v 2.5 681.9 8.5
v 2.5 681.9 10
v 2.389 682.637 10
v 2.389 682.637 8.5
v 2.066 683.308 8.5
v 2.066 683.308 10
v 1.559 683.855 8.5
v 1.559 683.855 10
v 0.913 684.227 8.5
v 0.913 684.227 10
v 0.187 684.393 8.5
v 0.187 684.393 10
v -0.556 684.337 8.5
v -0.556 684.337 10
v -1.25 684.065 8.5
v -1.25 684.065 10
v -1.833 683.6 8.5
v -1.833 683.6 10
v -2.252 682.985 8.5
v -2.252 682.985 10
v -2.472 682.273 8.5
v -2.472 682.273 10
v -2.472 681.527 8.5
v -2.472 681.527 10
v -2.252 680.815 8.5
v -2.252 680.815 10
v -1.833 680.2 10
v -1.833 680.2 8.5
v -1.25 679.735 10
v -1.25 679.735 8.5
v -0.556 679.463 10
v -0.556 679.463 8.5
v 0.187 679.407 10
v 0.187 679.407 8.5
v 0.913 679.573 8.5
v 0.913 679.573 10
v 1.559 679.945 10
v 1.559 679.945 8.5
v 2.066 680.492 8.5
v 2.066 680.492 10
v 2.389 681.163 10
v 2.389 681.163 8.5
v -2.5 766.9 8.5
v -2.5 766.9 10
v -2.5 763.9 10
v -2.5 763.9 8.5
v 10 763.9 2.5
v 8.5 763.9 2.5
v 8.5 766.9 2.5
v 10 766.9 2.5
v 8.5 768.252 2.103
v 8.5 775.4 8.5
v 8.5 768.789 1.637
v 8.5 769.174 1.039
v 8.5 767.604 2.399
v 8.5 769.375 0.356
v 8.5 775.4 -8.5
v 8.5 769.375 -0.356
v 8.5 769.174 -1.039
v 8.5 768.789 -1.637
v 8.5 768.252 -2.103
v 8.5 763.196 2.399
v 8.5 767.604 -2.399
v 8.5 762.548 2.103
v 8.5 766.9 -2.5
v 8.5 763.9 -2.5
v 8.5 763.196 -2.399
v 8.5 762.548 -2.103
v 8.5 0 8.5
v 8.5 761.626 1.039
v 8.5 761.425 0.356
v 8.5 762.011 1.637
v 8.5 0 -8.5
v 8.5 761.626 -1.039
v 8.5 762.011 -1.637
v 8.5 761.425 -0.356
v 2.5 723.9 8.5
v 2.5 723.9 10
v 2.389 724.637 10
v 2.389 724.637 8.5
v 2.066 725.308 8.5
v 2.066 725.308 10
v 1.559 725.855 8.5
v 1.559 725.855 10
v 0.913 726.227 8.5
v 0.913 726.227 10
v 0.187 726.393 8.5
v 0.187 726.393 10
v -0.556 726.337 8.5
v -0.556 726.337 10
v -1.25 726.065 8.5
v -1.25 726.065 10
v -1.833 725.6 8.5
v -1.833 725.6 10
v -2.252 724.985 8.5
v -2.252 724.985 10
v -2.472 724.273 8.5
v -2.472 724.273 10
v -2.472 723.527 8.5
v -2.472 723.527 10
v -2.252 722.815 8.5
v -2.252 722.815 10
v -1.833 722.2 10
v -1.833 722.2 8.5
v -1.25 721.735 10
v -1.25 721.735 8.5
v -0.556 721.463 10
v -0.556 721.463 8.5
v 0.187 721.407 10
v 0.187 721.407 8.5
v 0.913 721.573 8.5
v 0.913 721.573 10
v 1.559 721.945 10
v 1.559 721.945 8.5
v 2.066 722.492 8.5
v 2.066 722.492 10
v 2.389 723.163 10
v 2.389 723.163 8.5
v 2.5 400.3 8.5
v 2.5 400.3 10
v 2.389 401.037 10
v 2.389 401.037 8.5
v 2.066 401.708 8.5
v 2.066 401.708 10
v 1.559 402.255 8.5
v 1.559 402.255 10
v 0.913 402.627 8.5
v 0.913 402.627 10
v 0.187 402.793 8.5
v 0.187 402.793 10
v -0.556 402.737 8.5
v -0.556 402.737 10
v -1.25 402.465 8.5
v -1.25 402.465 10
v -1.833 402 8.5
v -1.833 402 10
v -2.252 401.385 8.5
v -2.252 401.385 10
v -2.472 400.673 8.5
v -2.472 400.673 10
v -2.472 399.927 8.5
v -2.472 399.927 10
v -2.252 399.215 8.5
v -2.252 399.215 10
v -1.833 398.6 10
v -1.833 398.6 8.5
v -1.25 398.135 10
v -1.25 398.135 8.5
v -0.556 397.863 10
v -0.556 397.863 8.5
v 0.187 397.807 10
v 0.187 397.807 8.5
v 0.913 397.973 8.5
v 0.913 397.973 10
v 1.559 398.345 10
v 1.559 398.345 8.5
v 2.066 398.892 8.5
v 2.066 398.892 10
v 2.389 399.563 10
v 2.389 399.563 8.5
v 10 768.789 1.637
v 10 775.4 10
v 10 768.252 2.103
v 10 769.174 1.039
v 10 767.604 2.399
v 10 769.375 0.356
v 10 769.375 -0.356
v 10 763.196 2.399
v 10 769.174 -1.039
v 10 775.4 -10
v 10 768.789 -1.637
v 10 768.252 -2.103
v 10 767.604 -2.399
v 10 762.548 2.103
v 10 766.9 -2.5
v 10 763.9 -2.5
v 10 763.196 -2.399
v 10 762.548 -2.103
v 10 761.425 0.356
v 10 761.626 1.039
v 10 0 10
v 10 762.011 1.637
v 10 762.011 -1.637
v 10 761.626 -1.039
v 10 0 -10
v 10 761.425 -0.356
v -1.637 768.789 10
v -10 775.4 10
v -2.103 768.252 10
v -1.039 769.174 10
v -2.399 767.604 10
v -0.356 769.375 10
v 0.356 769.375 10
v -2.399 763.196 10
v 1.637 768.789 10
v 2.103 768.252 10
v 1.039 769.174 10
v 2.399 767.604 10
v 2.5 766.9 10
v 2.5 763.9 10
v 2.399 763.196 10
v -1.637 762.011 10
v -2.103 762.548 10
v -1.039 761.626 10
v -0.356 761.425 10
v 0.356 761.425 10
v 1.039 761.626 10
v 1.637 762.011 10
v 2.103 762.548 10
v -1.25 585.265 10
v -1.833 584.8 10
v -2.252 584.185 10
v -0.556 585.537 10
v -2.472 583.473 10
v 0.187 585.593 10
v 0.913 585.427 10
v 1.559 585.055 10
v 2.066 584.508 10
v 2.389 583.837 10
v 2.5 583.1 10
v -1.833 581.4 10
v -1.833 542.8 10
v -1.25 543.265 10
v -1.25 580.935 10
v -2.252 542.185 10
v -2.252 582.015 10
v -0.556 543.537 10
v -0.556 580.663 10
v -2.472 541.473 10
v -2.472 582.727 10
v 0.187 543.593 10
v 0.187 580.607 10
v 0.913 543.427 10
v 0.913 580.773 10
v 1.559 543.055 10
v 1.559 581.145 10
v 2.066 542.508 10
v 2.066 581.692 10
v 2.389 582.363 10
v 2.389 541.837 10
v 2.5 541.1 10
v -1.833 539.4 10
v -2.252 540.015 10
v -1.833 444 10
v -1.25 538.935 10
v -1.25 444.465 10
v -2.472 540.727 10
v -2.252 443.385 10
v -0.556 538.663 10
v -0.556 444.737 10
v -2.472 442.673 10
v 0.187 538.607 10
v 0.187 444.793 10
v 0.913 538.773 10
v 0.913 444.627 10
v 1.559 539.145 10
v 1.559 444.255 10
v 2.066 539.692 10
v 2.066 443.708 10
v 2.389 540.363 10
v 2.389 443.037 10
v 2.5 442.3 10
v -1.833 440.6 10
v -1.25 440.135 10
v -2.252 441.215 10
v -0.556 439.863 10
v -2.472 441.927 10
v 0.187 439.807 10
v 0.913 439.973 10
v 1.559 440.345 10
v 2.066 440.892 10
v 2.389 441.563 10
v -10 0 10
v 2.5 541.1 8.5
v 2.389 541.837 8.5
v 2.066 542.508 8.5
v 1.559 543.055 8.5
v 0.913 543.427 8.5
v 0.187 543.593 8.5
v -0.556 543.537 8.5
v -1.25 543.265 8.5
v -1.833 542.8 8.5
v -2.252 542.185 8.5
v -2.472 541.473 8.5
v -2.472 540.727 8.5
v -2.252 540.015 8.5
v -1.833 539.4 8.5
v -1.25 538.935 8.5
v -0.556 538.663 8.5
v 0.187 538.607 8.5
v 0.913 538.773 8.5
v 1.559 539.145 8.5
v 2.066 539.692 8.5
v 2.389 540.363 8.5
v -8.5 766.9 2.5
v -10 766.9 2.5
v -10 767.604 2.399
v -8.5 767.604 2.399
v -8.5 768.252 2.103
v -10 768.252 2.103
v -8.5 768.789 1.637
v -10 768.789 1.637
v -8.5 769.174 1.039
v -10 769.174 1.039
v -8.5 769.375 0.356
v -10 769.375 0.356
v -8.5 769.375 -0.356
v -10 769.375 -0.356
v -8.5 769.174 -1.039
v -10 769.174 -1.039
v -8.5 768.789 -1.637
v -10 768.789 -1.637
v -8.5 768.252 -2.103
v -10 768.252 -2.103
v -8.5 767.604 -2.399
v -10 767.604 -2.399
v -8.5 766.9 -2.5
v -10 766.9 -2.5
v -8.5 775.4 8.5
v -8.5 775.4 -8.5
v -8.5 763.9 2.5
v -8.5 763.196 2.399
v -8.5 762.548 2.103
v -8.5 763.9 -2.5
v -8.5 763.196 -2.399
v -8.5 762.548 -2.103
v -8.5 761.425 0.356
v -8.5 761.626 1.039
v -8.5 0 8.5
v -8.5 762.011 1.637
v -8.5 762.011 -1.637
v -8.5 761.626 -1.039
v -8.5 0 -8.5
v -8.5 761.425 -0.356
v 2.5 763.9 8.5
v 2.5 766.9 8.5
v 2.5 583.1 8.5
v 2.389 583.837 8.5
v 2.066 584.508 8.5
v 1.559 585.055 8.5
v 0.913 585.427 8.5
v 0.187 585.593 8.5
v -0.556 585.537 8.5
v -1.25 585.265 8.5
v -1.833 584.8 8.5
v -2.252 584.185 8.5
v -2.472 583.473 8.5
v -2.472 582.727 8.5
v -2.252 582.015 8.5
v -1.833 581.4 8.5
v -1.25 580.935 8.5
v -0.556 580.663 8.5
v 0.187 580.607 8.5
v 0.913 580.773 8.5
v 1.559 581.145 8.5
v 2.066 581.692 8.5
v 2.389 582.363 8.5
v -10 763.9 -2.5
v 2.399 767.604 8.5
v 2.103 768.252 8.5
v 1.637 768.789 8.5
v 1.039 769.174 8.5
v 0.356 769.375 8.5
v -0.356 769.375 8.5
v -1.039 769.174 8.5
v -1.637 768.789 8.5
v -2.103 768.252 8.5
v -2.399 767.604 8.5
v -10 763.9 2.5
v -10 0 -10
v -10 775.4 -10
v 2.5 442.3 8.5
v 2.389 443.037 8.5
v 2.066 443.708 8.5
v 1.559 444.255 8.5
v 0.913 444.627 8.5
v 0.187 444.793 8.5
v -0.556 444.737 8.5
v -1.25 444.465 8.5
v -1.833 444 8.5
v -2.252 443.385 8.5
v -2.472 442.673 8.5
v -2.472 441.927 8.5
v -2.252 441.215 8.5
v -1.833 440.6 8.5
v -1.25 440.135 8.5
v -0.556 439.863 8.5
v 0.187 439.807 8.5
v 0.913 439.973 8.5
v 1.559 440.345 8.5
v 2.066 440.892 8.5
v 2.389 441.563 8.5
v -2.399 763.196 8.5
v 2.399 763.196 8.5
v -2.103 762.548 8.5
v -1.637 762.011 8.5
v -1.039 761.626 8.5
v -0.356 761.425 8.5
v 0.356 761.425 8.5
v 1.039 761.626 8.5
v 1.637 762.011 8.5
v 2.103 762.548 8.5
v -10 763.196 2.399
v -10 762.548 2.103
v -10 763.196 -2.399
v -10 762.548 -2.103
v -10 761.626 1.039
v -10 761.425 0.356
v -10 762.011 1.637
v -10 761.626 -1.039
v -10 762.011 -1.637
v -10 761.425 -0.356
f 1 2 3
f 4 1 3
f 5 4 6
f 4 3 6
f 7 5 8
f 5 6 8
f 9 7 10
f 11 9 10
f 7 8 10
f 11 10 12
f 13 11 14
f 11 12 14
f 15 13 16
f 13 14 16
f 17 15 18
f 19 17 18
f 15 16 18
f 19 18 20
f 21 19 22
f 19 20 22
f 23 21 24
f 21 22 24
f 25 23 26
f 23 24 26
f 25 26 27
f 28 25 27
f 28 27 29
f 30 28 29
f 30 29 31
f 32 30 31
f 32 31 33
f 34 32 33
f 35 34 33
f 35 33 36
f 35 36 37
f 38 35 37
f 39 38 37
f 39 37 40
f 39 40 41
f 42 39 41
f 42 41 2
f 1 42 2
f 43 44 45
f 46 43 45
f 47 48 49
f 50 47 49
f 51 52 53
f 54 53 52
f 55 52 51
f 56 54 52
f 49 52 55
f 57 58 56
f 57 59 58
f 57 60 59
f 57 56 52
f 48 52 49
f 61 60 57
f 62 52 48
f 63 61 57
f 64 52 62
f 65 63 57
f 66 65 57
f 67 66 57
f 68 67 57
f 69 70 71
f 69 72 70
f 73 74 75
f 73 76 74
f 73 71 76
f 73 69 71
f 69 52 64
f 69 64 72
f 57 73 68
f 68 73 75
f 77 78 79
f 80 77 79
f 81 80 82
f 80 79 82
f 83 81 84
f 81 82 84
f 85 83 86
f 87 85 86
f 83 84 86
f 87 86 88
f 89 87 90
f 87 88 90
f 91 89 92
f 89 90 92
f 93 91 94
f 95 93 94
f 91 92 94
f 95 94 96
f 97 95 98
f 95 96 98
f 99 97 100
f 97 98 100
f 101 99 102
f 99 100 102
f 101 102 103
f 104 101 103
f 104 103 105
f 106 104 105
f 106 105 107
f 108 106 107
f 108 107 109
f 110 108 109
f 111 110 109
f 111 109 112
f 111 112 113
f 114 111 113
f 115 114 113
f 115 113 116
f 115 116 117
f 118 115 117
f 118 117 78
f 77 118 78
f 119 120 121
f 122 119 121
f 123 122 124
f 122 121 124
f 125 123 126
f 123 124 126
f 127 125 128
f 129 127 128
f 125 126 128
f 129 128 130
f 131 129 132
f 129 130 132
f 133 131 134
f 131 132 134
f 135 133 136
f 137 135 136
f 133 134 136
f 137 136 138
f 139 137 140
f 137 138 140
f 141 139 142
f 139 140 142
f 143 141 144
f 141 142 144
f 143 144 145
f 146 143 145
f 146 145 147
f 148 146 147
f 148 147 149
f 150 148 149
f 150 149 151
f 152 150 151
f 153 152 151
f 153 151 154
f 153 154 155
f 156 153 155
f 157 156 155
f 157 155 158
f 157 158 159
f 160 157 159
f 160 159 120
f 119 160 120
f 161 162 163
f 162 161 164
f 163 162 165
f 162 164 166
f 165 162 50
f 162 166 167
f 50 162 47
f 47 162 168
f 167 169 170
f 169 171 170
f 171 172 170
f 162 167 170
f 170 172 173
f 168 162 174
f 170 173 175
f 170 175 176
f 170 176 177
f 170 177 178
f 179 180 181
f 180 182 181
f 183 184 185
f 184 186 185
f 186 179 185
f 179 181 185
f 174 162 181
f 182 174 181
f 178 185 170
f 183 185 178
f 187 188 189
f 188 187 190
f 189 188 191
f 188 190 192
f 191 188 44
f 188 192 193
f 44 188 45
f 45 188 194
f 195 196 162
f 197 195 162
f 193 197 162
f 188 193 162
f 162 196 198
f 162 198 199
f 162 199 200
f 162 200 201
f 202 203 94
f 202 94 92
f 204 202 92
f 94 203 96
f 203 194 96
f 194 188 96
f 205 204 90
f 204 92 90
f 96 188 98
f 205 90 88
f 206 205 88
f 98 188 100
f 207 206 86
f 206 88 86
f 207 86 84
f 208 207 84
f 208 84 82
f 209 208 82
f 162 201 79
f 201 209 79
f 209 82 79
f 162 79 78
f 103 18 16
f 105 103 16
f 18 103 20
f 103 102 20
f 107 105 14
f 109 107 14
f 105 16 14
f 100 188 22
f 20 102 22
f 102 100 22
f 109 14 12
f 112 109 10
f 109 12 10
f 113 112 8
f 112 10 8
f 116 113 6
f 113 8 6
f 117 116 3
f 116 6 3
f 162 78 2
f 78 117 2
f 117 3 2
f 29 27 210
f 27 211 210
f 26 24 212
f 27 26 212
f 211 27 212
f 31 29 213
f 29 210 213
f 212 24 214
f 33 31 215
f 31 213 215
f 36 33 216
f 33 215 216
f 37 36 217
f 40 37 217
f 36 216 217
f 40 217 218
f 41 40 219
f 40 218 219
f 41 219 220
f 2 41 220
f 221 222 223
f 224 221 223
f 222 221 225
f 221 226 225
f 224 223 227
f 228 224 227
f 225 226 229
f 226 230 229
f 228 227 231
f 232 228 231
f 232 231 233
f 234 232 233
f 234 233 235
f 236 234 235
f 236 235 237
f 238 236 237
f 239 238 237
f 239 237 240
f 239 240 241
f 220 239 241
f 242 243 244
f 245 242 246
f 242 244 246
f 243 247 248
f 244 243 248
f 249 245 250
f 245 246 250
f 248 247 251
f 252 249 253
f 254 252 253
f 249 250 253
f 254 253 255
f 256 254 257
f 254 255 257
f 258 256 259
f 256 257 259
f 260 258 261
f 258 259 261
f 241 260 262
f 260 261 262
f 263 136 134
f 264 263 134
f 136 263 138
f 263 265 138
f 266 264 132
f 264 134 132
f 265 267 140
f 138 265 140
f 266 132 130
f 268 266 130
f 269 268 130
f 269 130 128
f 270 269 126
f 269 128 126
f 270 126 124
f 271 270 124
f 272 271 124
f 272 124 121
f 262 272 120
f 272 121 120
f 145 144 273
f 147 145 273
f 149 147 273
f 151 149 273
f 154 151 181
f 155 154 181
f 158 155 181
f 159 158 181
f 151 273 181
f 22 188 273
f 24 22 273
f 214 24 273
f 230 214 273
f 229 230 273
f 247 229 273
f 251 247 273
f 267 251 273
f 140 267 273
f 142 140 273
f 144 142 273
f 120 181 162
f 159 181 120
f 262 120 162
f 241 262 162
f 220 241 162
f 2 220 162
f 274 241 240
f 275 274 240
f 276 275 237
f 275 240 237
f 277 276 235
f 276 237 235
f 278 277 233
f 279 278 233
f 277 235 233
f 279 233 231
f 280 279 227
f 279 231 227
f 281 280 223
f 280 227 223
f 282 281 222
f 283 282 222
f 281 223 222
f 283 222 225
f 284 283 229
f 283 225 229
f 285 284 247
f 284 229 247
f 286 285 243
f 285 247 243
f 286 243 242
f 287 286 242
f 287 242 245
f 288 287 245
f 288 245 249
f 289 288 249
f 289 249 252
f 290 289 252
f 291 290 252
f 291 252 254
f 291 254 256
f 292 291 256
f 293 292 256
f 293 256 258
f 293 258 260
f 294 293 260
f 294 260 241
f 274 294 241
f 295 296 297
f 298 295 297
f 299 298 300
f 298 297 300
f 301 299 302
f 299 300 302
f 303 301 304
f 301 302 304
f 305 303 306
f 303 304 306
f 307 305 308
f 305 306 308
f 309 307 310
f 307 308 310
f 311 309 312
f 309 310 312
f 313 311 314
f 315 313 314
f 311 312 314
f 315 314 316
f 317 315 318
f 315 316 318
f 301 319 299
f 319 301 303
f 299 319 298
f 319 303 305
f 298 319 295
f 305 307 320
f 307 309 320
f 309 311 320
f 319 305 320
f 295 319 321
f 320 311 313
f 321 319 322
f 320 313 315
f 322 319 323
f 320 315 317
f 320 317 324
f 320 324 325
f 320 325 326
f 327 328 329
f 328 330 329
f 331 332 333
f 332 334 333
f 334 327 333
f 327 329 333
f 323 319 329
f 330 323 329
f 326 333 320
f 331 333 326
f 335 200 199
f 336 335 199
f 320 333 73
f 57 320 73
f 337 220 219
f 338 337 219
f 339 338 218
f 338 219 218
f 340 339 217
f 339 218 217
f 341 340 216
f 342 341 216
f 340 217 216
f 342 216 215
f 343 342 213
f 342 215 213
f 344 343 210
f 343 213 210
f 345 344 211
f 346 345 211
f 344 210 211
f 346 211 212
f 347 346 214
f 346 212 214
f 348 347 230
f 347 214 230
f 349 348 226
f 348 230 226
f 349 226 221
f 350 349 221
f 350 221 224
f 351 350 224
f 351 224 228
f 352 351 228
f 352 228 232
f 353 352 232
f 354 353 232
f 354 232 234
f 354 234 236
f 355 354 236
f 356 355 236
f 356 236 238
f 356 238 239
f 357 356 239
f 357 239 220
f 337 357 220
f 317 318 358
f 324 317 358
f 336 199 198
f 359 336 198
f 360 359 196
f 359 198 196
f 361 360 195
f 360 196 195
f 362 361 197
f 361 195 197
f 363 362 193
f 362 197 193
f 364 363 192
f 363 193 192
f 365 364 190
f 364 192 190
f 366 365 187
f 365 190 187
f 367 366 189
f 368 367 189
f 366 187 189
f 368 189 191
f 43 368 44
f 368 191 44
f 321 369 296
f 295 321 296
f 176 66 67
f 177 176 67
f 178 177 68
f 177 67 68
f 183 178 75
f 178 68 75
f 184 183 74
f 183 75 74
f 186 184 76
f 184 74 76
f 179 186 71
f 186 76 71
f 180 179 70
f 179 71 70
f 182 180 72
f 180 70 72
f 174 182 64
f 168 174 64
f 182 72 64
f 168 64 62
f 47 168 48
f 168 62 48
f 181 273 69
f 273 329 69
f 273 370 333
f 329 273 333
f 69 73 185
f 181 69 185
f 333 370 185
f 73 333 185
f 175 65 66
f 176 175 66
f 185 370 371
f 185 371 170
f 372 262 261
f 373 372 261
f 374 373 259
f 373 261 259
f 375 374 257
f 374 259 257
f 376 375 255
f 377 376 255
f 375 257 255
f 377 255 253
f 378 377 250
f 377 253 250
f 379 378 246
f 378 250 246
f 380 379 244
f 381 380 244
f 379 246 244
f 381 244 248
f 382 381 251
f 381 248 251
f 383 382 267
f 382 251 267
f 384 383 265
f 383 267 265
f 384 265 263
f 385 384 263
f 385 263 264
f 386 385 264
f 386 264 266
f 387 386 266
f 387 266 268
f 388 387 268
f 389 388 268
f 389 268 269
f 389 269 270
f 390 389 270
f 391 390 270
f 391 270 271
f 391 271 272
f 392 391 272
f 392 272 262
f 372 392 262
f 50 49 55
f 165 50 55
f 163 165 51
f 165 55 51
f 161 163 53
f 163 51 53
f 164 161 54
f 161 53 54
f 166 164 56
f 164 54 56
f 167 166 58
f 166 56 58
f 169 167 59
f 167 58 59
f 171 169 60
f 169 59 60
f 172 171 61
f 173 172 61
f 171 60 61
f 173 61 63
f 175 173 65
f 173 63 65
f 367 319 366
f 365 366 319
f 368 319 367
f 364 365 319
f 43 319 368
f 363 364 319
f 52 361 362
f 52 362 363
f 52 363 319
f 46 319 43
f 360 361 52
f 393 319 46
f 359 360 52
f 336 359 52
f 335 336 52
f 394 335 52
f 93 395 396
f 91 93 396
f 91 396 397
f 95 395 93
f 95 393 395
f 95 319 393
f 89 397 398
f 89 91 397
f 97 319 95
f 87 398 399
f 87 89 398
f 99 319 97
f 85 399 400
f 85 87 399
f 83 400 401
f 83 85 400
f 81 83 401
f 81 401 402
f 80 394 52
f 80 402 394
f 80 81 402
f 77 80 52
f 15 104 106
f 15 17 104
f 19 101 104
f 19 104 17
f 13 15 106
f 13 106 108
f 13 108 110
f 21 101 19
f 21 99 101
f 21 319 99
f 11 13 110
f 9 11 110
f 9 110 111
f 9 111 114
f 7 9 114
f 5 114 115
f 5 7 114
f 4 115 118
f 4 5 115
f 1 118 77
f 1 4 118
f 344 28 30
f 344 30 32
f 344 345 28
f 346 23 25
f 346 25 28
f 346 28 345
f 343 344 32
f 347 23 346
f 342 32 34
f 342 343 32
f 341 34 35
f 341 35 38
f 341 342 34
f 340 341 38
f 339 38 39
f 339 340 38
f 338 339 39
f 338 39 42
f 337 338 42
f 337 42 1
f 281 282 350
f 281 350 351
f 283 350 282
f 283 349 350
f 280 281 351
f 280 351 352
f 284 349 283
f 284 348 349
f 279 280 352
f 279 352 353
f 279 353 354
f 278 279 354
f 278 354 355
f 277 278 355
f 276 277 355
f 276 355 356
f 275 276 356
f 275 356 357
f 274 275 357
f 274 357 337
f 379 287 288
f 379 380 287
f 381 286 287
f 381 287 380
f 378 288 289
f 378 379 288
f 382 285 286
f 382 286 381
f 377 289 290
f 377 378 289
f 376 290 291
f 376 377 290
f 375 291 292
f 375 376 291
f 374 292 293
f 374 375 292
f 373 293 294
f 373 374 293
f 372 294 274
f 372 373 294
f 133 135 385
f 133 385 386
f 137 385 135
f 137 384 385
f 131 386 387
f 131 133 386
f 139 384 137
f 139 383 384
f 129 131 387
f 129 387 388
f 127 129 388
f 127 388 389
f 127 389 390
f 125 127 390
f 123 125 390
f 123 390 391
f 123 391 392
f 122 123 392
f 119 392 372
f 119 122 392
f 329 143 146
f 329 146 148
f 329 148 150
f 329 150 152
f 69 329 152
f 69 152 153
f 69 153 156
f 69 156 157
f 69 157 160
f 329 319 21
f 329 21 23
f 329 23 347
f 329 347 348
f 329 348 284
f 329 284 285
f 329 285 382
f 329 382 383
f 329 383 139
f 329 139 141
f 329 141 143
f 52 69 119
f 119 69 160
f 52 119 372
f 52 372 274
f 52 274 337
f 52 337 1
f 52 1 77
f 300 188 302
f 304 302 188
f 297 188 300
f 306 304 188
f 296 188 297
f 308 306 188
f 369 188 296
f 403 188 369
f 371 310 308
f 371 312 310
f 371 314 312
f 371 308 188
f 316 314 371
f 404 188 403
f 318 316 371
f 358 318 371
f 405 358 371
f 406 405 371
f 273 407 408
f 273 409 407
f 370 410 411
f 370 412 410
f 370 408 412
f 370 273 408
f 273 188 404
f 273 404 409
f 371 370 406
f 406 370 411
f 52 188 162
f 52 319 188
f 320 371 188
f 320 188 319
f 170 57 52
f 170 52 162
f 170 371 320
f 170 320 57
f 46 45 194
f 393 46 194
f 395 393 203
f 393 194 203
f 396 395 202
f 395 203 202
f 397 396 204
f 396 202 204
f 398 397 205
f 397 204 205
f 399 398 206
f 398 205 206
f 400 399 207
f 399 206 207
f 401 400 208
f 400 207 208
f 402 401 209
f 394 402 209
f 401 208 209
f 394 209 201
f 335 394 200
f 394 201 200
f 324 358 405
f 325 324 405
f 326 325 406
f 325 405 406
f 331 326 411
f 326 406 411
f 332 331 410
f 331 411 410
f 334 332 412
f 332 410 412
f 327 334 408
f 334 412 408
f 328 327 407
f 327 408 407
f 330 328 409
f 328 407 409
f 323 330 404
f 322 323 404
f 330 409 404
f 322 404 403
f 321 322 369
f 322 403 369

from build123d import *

# Parameters (mm, degrees)
SKETCH1_W           = 20
SKETCH1_H           = 20
SKETCH1_W_2         = 17
SKETCH1_H_2         = 17
BOSS_EXTRUDE1_DEPTH = 775.4
CUT_EXTRUDE1_DEPTH  = 5
SKETCH3_R           = 2.5
CUT_EXTRUDE8_DEPTH  = 5
CUT_EXTRUDE10_DEPTH = 101


with BuildPart() as part:
    # Sketch1 → Boss-Extrude1 (new body)
    with BuildSketch(Plane(origin=(0, 0, 0), x_dir=(1, 0, 0), z_dir=(0, 1, 0))):
        Rectangle(SKETCH1_W, SKETCH1_H)
        Rectangle(SKETCH1_W_2, SKETCH1_H_2, mode=Mode.SUBTRACT)
    extrude(amount=BOSS_EXTRUDE1_DEPTH)

    # Sketch2 → Cut-Extrude1 (cut)
    with BuildSketch(Plane.XY.offset(10)):
        with BuildLine():
            Line((-2.5, 766.9), (-2.5, 763.9))
            ThreePointArc((-2.5, 763.9), (0, 761.4), (2.5, 763.9))
            Line((2.5, 763.9), (2.5, 766.9))
            ThreePointArc((2.5, 766.9), (0, 769.4), (-2.5, 766.9))
        make_face()
    extrude(amount=-CUT_EXTRUDE1_DEPTH, mode=Mode.SUBTRACT)

    # Sketch3 → Cut-Extrude8 (cut)
    with BuildSketch(Plane.XY.offset(10)):
        with Locations((0, 723.9)):
            Circle(SKETCH3_R)
        with Locations((0, 681.9)):
            Circle(SKETCH3_R)
        with Locations((0, 583.1)):
            Circle(SKETCH3_R)
        with Locations((0, 541.1)):
            Circle(SKETCH3_R)
        with Locations((0, 442.3)):
            Circle(SKETCH3_R)
        with Locations((0, 400.3)):
            Circle(SKETCH3_R)
    extrude(amount=-CUT_EXTRUDE8_DEPTH, mode=Mode.SUBTRACT)

    # Sketch10 → Cut-Extrude10 (cut)
    with BuildSketch(Plane.ZY.offset(10)):
        with BuildLine():
            Line((-2.5, 766.9), (-2.5, 763.9))
            ThreePointArc((-2.5, 763.9), (0, 761.4), (2.5, 763.9))
            Line((2.5, 763.9), (2.5, 766.9))
            ThreePointArc((2.5, 766.9), (0, 769.4), (-2.5, 766.9))
        make_face()
    extrude(amount=-CUT_EXTRUDE10_DEPTH, mode=Mode.SUBTRACT)


solid = part.part
